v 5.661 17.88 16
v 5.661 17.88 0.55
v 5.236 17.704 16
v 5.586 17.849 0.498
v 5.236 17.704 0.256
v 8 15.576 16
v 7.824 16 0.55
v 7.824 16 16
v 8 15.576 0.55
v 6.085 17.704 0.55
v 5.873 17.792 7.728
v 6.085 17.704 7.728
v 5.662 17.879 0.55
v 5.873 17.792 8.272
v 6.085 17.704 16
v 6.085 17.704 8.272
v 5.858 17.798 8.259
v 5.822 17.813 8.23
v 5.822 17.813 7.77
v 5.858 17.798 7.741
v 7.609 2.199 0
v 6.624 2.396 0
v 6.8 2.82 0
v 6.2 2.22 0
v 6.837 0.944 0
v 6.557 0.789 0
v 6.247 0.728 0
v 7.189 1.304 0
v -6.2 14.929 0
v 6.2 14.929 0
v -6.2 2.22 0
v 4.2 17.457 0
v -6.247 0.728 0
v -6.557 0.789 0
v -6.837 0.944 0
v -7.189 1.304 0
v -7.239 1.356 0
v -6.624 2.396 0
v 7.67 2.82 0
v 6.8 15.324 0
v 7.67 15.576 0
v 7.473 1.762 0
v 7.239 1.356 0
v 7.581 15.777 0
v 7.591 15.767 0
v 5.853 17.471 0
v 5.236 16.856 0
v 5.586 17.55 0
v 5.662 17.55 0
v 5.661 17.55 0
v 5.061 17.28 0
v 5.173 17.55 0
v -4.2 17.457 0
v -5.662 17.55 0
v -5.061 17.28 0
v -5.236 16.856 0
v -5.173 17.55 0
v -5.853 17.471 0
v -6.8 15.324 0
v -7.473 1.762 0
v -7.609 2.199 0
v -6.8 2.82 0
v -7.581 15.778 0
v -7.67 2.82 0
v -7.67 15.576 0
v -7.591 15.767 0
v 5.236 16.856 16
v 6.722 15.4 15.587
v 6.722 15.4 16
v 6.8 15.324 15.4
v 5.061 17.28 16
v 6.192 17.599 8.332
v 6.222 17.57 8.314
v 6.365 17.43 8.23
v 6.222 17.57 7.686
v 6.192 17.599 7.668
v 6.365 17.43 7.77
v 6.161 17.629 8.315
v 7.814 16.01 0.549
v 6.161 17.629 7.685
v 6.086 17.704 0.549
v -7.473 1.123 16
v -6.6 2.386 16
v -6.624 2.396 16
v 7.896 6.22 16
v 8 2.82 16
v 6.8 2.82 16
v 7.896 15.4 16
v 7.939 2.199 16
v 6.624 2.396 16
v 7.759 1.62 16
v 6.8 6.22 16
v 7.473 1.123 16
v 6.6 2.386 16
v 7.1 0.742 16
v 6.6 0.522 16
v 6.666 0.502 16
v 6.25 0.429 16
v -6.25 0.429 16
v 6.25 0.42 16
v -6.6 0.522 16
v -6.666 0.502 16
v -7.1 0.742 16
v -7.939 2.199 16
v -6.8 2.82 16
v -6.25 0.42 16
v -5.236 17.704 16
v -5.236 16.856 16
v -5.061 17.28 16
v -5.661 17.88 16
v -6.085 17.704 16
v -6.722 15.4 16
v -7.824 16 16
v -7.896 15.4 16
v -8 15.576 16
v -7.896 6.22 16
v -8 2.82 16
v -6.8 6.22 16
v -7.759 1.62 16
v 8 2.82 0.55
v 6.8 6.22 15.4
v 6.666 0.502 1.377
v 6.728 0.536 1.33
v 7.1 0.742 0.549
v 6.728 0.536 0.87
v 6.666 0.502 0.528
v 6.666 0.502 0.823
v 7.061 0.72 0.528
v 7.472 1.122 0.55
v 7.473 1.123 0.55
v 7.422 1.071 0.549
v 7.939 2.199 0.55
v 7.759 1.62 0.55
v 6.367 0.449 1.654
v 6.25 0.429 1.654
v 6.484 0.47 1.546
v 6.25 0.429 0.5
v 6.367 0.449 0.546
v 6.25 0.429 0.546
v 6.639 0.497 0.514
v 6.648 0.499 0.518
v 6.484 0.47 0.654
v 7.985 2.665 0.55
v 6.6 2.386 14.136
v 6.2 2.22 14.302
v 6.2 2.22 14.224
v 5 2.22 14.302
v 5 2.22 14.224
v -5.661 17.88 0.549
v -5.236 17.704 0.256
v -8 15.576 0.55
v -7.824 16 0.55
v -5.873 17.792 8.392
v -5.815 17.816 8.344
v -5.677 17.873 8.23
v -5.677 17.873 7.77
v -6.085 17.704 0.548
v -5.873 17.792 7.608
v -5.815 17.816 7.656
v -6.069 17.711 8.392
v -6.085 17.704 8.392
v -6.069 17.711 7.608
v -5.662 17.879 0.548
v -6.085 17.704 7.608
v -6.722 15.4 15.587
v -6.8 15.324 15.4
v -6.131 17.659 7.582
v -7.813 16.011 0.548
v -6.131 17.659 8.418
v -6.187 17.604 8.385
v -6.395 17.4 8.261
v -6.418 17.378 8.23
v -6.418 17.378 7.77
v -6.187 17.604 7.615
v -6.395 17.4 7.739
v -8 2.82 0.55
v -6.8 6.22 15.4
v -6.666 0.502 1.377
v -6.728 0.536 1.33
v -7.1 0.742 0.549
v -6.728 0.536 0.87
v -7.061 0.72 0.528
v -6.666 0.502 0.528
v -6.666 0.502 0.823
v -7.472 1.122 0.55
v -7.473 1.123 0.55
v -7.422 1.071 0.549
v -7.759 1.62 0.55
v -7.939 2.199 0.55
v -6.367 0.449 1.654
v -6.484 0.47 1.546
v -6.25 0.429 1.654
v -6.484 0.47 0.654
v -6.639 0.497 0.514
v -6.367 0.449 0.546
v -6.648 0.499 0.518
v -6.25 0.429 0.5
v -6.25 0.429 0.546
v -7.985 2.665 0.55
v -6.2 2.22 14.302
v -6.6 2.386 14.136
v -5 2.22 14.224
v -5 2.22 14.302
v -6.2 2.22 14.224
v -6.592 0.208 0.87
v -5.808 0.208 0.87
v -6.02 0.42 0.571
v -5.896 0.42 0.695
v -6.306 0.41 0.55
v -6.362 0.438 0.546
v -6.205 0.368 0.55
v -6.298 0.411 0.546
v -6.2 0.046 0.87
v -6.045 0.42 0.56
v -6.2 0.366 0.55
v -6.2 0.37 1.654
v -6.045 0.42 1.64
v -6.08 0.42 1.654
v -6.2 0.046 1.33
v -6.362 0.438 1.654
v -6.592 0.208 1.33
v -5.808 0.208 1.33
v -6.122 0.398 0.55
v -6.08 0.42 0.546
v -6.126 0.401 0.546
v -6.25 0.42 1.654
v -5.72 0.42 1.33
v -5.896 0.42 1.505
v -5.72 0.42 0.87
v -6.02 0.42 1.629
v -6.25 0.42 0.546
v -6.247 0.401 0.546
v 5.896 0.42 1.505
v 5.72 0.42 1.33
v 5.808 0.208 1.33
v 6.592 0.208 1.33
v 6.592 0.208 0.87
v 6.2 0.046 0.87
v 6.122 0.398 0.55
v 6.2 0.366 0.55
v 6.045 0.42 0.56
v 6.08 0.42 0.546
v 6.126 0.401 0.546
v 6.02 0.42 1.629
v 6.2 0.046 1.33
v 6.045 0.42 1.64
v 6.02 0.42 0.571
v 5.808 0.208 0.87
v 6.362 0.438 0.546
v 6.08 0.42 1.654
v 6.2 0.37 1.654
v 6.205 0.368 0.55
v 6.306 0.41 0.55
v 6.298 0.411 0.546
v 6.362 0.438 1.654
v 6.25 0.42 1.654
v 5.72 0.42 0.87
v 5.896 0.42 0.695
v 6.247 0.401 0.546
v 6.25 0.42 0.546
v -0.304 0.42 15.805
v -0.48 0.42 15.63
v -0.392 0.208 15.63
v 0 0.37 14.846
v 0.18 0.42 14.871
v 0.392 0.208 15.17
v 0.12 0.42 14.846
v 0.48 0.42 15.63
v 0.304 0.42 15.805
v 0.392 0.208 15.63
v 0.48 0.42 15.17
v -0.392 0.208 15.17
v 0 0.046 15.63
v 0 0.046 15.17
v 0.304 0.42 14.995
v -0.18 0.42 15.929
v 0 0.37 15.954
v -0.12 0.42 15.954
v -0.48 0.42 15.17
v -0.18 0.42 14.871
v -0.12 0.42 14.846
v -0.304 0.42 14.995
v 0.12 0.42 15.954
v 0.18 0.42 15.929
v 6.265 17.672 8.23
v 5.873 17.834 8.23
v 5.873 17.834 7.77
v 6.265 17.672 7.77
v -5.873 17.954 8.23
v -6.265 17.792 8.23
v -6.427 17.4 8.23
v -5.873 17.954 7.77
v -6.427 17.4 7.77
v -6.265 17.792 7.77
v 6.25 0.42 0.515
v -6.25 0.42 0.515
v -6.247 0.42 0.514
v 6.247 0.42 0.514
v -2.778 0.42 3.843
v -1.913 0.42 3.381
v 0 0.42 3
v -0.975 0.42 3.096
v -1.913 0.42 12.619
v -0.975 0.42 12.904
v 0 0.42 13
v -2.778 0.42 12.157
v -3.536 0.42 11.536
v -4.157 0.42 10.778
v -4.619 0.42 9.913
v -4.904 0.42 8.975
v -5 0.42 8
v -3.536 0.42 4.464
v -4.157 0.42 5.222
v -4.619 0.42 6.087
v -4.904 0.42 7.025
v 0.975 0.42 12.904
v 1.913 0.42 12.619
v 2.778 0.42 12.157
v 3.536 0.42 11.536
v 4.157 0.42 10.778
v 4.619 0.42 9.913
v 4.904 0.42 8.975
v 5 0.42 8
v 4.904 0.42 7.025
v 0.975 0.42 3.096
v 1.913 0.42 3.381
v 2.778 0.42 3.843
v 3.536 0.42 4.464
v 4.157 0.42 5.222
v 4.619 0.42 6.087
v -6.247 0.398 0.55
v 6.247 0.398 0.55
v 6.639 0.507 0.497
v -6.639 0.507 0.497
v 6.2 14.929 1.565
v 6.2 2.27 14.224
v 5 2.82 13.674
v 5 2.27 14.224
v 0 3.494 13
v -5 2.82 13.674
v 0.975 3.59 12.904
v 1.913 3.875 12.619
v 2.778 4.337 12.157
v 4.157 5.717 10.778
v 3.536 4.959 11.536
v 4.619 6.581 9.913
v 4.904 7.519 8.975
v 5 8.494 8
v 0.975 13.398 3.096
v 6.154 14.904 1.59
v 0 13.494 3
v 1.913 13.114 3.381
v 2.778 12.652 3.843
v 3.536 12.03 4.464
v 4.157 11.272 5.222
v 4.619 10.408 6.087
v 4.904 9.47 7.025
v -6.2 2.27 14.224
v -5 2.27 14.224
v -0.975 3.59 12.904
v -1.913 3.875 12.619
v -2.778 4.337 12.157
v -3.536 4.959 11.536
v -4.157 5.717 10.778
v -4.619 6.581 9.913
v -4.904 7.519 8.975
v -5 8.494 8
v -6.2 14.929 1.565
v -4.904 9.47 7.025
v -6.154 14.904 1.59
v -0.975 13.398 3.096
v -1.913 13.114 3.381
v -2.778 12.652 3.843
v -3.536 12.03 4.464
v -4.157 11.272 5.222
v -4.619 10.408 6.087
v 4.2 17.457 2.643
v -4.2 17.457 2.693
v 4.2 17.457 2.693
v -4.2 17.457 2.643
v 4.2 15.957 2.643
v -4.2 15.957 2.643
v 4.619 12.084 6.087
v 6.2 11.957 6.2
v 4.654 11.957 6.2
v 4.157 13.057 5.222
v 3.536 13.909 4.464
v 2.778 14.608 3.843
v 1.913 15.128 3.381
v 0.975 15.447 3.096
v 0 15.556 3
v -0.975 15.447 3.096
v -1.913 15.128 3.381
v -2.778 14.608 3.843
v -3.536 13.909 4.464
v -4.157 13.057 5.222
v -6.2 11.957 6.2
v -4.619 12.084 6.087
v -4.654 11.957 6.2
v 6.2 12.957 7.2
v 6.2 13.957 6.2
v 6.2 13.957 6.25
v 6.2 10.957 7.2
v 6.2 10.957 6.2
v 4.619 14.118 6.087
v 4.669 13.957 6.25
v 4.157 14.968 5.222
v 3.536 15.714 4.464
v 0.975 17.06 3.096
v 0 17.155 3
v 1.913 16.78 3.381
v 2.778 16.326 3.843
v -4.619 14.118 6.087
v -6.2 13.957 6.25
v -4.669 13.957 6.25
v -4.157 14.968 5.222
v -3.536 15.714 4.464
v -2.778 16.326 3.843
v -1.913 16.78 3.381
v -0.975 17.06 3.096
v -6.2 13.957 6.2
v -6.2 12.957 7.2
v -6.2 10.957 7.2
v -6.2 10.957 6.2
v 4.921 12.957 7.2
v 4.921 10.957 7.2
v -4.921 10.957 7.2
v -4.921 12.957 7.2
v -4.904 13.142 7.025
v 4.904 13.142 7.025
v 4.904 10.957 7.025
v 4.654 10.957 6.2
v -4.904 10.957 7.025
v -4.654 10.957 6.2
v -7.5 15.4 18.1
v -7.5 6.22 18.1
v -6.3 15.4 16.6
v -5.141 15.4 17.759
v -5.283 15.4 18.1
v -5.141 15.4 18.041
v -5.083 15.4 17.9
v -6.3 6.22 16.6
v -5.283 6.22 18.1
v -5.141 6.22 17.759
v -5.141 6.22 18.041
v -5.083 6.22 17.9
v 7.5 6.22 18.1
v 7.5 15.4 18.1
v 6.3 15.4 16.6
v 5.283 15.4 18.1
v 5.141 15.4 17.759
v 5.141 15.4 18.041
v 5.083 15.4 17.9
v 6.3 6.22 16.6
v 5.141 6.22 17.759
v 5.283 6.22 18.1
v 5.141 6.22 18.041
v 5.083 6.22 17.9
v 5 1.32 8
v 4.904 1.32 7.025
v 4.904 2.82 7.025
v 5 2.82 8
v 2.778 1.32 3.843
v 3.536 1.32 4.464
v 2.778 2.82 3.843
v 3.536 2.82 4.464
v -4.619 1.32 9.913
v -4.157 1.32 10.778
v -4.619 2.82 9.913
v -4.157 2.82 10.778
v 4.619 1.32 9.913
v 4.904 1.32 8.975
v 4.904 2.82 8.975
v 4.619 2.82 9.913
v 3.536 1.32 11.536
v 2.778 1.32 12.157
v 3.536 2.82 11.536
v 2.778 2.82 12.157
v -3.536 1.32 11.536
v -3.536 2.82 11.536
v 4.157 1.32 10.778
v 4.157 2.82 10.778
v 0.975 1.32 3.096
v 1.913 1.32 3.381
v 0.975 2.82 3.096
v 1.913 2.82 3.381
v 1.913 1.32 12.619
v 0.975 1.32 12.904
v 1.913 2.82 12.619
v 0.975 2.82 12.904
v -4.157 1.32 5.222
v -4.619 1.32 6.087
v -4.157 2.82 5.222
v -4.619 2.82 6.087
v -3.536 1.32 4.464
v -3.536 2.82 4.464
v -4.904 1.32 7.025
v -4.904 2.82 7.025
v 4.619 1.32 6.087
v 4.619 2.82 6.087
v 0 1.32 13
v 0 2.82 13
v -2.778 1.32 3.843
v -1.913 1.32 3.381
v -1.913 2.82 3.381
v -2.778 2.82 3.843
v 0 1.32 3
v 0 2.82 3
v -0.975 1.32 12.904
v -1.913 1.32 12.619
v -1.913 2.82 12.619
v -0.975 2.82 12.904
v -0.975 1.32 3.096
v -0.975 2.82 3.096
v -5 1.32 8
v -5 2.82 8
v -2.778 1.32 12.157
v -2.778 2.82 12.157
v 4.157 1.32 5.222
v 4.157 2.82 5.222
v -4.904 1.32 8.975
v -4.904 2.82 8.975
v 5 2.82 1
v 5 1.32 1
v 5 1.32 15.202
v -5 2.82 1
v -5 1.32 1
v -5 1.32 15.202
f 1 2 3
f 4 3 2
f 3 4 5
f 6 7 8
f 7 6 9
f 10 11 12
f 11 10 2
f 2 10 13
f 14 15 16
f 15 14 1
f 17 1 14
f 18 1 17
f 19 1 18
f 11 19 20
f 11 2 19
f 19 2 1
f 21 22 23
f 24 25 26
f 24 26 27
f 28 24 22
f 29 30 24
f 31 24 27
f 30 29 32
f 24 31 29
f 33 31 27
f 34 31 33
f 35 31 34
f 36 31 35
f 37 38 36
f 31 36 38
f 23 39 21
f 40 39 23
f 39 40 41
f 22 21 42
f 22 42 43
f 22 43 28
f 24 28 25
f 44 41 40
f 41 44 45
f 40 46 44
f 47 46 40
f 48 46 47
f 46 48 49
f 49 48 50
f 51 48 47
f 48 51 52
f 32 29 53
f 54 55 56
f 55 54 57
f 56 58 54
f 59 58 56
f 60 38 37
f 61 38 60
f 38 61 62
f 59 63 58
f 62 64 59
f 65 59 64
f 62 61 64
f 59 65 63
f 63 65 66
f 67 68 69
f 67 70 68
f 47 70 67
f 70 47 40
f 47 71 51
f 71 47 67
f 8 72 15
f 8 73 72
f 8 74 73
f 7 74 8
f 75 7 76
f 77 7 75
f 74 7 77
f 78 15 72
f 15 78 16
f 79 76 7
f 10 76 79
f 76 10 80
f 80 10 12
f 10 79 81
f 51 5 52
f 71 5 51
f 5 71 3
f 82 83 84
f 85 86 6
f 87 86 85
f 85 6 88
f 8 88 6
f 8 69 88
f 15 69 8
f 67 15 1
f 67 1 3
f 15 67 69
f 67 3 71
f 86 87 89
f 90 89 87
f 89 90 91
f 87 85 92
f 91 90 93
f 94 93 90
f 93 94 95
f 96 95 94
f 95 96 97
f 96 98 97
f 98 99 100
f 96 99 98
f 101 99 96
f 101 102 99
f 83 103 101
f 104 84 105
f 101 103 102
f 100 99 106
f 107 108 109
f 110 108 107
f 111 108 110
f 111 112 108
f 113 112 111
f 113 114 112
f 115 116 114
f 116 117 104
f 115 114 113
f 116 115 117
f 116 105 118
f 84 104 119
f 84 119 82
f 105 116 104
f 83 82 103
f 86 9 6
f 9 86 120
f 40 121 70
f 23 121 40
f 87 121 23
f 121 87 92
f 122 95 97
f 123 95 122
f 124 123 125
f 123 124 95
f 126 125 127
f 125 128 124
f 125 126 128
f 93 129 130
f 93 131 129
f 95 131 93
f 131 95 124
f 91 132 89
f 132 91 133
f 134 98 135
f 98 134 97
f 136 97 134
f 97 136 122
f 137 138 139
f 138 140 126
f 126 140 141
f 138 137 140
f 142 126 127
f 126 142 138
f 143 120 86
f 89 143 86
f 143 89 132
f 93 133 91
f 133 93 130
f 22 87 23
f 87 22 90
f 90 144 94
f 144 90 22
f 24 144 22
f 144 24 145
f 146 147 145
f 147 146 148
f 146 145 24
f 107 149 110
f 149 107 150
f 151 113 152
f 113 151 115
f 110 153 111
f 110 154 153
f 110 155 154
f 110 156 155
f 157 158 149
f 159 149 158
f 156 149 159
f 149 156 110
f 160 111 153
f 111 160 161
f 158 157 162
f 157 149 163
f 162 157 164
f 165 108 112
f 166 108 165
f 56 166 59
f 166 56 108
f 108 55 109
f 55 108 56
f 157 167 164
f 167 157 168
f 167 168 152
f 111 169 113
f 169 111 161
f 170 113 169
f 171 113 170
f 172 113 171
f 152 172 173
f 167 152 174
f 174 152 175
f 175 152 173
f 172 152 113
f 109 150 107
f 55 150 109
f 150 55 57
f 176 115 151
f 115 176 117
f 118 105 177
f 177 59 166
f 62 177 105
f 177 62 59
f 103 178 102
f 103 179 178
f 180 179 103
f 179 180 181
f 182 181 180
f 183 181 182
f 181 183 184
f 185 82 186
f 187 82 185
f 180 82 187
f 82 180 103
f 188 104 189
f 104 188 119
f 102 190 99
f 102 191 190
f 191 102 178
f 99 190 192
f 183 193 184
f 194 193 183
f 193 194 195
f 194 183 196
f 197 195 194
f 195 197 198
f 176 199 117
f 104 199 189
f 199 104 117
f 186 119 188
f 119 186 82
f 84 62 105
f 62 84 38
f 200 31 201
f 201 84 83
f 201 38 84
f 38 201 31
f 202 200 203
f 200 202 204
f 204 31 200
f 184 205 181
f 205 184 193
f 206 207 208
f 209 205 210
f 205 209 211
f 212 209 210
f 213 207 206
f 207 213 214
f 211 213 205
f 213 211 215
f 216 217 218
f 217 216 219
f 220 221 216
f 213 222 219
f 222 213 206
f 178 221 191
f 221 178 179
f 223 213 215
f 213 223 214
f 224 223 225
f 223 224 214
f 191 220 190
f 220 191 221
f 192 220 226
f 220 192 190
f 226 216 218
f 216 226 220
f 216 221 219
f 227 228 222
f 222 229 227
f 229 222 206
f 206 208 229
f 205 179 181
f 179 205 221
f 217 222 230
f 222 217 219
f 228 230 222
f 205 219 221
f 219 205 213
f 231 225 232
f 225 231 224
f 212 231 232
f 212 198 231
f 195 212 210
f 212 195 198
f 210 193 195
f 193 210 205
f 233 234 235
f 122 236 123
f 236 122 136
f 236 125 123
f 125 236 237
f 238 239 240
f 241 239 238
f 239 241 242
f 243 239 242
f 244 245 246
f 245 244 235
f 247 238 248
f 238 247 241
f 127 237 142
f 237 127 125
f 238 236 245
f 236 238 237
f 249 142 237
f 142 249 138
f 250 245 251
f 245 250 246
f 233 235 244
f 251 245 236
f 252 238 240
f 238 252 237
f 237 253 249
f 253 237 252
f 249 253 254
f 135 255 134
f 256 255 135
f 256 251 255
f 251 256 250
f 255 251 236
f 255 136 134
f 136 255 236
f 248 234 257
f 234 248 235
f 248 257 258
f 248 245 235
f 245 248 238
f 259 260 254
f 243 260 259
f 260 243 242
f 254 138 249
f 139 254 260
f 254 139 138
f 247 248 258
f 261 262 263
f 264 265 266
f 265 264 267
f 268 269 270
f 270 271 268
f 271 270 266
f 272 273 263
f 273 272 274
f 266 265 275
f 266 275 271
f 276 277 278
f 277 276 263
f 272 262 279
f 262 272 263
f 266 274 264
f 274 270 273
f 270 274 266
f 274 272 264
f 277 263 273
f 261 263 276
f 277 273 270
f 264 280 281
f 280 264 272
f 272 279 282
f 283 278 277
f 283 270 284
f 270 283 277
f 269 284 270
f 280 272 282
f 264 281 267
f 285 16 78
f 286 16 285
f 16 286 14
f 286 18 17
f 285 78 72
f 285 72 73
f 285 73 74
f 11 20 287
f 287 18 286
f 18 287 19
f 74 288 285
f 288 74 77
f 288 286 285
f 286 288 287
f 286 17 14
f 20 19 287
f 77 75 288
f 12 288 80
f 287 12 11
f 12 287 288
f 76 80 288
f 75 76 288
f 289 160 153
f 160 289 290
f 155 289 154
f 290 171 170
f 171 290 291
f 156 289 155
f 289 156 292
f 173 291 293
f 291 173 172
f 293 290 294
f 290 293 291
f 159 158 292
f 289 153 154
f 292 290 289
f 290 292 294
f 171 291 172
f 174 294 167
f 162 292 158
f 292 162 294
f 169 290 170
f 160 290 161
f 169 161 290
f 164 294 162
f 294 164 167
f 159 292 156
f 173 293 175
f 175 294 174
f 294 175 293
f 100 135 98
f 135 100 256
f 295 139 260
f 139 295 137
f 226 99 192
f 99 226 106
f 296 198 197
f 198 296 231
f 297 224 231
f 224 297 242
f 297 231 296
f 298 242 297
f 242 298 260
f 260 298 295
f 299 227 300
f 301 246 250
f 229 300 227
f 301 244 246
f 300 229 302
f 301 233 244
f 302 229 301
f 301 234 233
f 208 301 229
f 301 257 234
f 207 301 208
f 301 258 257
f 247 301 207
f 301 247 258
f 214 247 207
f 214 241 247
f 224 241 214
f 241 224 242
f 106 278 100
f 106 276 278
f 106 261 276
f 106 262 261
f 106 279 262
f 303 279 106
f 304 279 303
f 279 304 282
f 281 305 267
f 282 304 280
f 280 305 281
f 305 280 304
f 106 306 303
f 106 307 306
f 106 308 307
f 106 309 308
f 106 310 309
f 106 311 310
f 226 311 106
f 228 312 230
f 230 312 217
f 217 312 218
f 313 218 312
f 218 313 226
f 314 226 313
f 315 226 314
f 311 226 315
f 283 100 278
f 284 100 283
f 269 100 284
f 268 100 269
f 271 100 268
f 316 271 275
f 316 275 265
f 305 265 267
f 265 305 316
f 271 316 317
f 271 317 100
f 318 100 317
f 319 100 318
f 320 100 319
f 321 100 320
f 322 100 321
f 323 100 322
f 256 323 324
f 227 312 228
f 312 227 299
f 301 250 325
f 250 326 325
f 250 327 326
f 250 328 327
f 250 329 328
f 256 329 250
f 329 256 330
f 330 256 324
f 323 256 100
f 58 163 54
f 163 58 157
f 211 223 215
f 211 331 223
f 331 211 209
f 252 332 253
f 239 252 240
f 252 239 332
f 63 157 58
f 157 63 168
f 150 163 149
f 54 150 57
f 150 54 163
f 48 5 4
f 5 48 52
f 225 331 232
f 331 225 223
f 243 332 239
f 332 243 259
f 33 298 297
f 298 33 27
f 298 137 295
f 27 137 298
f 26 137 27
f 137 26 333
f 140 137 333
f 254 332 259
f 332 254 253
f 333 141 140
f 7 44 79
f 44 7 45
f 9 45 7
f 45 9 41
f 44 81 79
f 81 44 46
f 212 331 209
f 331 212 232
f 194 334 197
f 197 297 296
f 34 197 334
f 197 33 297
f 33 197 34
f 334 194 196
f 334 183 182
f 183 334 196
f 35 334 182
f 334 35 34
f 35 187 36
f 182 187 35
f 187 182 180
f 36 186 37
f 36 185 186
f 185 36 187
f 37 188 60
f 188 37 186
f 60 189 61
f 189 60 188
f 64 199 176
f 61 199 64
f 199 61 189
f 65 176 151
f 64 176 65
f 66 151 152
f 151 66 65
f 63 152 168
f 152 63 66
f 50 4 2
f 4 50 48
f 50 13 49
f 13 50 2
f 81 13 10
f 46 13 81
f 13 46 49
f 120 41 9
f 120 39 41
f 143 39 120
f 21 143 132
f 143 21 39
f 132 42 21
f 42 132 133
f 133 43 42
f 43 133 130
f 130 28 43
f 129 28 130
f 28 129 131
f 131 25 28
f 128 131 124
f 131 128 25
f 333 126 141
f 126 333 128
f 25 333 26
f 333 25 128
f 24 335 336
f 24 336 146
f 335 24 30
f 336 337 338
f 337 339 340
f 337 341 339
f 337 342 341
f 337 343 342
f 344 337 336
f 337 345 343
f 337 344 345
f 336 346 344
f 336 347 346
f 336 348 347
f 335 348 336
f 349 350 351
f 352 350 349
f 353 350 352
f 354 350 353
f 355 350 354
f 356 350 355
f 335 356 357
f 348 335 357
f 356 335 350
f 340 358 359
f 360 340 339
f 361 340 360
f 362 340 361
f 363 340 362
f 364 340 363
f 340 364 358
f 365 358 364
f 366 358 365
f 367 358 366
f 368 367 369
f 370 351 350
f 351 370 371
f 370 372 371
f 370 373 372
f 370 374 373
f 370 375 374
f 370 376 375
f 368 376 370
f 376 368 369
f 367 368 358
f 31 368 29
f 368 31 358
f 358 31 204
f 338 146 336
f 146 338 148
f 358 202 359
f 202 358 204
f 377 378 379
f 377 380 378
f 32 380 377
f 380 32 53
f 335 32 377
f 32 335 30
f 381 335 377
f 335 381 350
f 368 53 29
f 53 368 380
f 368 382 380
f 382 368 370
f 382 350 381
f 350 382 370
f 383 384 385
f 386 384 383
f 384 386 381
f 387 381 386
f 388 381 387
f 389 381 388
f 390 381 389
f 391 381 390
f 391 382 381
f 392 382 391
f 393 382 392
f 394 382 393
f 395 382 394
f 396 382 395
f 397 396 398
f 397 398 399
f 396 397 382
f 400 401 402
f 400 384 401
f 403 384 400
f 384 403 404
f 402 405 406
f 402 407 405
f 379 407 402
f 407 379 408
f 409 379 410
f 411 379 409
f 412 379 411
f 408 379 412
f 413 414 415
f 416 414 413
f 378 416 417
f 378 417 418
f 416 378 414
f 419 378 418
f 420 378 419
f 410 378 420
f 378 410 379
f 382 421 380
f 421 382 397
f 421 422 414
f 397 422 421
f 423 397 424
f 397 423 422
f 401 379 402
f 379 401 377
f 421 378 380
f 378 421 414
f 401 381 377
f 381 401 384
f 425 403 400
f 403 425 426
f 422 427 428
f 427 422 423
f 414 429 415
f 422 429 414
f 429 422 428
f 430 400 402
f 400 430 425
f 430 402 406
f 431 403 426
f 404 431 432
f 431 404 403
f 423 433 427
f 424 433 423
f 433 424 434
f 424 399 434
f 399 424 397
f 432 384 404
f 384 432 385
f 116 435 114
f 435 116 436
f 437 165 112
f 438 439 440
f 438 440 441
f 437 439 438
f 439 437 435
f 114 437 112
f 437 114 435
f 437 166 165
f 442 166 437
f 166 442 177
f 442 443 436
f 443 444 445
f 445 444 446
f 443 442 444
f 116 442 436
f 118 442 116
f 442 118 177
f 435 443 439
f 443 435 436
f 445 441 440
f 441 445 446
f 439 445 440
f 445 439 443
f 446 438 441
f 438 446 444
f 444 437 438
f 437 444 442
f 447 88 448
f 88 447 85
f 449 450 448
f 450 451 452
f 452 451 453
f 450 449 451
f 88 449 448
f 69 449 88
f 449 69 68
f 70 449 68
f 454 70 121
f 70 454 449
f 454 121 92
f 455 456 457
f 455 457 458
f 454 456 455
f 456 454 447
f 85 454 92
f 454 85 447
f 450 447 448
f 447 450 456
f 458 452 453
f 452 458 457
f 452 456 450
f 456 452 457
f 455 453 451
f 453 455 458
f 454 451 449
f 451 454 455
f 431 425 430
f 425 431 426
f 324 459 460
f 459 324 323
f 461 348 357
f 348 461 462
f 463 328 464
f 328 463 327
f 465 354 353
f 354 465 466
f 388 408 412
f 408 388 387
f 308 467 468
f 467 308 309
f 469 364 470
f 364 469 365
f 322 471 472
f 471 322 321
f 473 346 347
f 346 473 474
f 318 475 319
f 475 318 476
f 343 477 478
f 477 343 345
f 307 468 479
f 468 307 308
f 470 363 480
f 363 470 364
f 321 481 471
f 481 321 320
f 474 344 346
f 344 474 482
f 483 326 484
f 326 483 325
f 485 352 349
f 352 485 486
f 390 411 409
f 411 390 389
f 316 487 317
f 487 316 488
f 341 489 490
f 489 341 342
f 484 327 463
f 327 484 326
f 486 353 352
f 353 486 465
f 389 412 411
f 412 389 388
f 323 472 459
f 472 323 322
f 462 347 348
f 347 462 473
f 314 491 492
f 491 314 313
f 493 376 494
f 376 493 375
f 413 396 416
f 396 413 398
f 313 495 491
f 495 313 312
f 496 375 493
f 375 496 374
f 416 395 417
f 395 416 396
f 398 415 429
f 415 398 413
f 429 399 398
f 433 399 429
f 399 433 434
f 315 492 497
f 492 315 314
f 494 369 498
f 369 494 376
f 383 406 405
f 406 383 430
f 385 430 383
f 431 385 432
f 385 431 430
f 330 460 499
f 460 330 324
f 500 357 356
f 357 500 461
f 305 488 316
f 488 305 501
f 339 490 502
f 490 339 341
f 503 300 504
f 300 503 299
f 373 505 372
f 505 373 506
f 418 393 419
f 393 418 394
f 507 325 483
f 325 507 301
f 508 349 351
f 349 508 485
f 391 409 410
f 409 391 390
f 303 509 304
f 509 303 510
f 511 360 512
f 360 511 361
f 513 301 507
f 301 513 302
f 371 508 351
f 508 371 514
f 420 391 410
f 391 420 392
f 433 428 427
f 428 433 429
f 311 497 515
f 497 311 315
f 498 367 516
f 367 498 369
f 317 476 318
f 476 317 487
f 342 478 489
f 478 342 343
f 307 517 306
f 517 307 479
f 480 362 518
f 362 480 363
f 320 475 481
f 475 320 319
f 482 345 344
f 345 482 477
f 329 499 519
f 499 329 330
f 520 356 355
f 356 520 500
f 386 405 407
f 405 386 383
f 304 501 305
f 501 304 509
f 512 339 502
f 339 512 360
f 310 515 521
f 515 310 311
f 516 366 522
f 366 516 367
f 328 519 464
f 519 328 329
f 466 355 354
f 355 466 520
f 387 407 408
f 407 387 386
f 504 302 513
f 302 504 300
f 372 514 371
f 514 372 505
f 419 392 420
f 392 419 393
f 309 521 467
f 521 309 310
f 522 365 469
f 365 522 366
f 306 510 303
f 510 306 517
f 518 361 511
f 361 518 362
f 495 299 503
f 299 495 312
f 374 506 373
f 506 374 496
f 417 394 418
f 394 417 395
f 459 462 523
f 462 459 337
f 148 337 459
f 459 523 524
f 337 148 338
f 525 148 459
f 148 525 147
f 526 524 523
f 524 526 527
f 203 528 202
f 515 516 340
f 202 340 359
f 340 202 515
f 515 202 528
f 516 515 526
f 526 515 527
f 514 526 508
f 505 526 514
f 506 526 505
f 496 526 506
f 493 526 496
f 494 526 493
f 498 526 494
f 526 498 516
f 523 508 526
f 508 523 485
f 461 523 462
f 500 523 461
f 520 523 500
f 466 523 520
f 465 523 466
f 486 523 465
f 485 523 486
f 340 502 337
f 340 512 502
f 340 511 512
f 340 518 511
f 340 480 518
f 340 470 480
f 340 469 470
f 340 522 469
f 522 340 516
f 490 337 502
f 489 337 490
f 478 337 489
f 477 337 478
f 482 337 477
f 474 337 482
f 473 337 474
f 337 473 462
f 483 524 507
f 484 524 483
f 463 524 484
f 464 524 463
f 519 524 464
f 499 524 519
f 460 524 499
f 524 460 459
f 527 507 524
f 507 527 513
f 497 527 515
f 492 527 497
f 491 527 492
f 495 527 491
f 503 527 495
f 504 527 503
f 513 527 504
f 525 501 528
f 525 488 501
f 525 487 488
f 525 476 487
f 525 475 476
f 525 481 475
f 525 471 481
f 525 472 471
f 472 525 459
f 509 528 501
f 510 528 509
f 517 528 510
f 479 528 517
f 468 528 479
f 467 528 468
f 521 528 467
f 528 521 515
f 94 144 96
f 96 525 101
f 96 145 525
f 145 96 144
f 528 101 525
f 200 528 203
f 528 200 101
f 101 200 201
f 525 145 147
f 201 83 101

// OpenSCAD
// file: libs/libdict.scad
// This library add dictionary like features to openscad
// the dictionary is a list of pairs as we cannot define new types.
// Unlike a python dictionary we cannot do a proper hash table for speed
// so everything is build around the OpenSCAD search function
// There are a lot of assert statements to ensure data in the "dictionary"
// is in the format of
// * A list of lists
// * Each internal list has a length of two
// * First element of each internal list is a string (the key)
// * All keys are unique.


// Private function:
// This function returns true if the value is in the list
// value must be a string.
// No error checking, for use by is_in only!
function _is_in_str(value, list) = 
    search([value], list) != [[]];

// Private function:
// This function returns true if the value is in the list
// value must be a number.
// No error checking, for use by is_in only!
function _is_in_num(value, list) = 
    search(value, list) != [];


// This function returns true if the value is in the list
// value must be a string or a number.
function is_in(value, list) = 
    assert(is_num(value) || is_string(value) , "is_in: value must be a number or string")
    assert(is_list(list), "is_in: list must be a list")
    is_num(value) ? _is_in_num(value, list) : _is_in_str(value, list);

// An errant match is when a non-list matches with the first element in a list
// a list match a non list though. Cannot know which element is the non-list
// but we do know that it is errant if exactly one of them is not a list
function _check_errant_match(list, match) = let(
    non_list = [for (m = match) is_list(list[m])? 0 : 1],
    // note when recording count_nl (counting non lists) it is first recorded before anything is iterated.
    // the second recording happens after i is iterated to 0, then count_nl counts whether non_list[0] is 1
    count = [for (i=-1, count_nl=0; i<len(match);i=i+1,count_nl=count_nl+non_list[i]) count_nl]
    // the last element (count[len(match)] is equal to 1 on an errant match)
) count[len(match)] == 1 ? 0 : 1;

// Returns true if all emements in list are unique.
function is_unique(list) = 
    assert(is_list(list), "is_unique: list must be a list")
    let(
        matches = search(list, list, 0),
        // Assign 1 or 0 depending on is the match length for each element
        // return wether any matches are greater than one (mathcing more than
        // itself)
        // note cannot search for true or false so using 1 and zero
        bool_list = [for (match = matches) if (len(match)==1) 0 
            // should put a 1 here to show they matched but in the case of
            // [1, [1]] it will match both, so need to check if they are
            // both lists or both not list
            else _check_errant_match(list, match)]
    ) !is_in(1, bool_list);

// Private function:
// Checks that the input is a list and that every element is a list
// of length 2.
// No error checking, for use by valid_dict only!
function _is_pairs(list) =
    !is_list(list) ? false :
        len(list)==0 ? false :
            !is_in(0, [for (pair = list) is_list(pair) && len(pair)==2 ? 1: 0]);

// Private function:
// Checks all elements in the list are strings
// No error checking, for use by valid_dict only!
// Strings can't be empty
function _is_list_of_strings(list) =
    !is_in(0, [for (item = list) is_string(item) && len(item)>0 ? 1: 0]);

// Private function:
// Returns the keus in a dictionary
// No error checking, for use by valid_dict only!
function _keylist(dict)  = [for (pair=dict) pair[0]];
 
function valid_dict(dict) =
    //if the input are not pairs return instantly
    !_is_pairs(dict) ? false : let (
        //if they are pairs get all keys
        keys = _keylist(dict),
        all_strings =  _is_list_of_strings(keys),
        unique = is_unique(keys)
    ) (all_strings && unique) ? true : false;

// Key lookup for key value pair "dictionary".
// Unlike the built in lookup this works with strings.
function key_lookup(key, dict) = 
    assert(is_string(key), "`key` must be a string")
    assert(valid_dict(dict), "`dict` must be a valid 'dictionary'")
    let(
        // key is in [] because otherwise openscad will search for each letter rather than the string.
        index = search([key], dict, 1, 0)[0]
    )  assert (index!=[], "Key lookup failed, key not found!") dict[index][1];

// Creates a new dictionary with a key value pair replaced. Pair must already
// be in dictionary.
function replace_value(key, value, dict) = 
    assert(is_string(key), "`key` must be a string")
    assert(valid_dict(dict), "`dict` must be a valid 'dictionary'")
    assert(is_in(key, _keylist(dict)), "`key` not found in dictionary!")
    [for (kv_pair = dict) key!=kv_pair[0] ? kv_pair : [key, value]];


// Creates a new dictionary with a a set of key value pair replaced
// both inputs must be a dictionary. All keys in input must already be
// in dictionary
function replace_multiple_values(rep_dict, dict) =
    assert(valid_dict(rep_dict), "`rep dict` must be a valid 'dictionary'")
    assert(valid_dict(dict), "`dict` must be a valid 'dictionary'")
    let(
        // loop over all keys in replacement dict checking they are in the original
        rep_keys = [for (key = _keylist(rep_dict))
            assert(is_in(key, _keylist(dict)), "`key` not found in dictionary!")
            key
        ]
    ) //Finally return the updated dictionary using this long list comprehension.
    [
        for (kv_pair = dict) let(
            key = kv_pair[0],
            // check if this key is in the replacement dictionary and if so return index
            // key is in [] because otherwise openscad will search for each letter rather
            // than the string.
            index = search([key], rep_dict, 1, 0)[0]
            // if index is empty return original key value pair, else return the key with
            // the replaced value
        ) index == [] ? kv_pair : [key, rep_dict[index][1]]
    ];
// file: microscope_parameters.scad
/******************************************************************
*                                                                 *
* OpenFlexure Microscope: Microscope Parameters                   *
*                                                                 *
* This is the top-level configuration file for the OpenFlexure    *
* microscope, an open microscope and 3-axis translation stage.    *
* It gets really good precision over a ~10mm range, by using      *
* plastic flexure mechanisms.                                     *
*                                                                 *
* Generally I've tried to put parts (or collections of closely    *
* related parts) in their own files.  However, all the parts      *
* depend on the geometry of the microscope - so these parameters  *
* are gathered together here.  In general, the ones you might     *
* to change are towards the top!  Lower-down ones are defined in  *
* terms of higher-up ones - confusion might arise if you redefine *
* these later...                                                  *
*                                                                 *
* (c) Richard Bowman, January 2016                                *
* Released under the CERN Open Hardware License                   *
*                                                                 *
* http://www.github.com/rwb27/openflexure_microscope              *
* http://www.docubricks.com/projects/openflexure-microscope       *
* http://www.waterscope.org                                       *
*                                                                 *
******************************************************************/

use <libs/libdict.scad>

$fn=32;

// These are the most useful parameters to change!
motor_lugs = true;
version_numstring = "6.1.3";
camera = "picamera_2"; //see cameras/camera.scad for valid values
optics = "rms_f50d13"; //see optics.scad for valid values
led_r = 4.5/2; //size of the LED used for illumination
endstops = false; //whether to build mounts for optical endstops inside the microscope.
feet_endstops = false; //whether to include cut-outs for endstop switches in the feet.
beamsplitter = true; //enables a cut-out in some optics modules for a beamsplitter

enable_smart_brim = true;
tall_bucket_base = false; //If true creates a taller bucket base for the infinity corrected optics.

// This sets the basic geometry of the default microscope
// Stages can be built with modified parameters but with **no guarantee** that any other
// set of parameters will work.
// These parameters define the default size for the structural elements of the micoroscope, optics parameters are set seperately.
function default_params() = [["leg_r", 30],     // radius on which the innermost part of legs sit. (This sets the stage size)
                             ["sample_z", 75 ], // z position of sample
                             ["stage_t", 15],   //thickness of the XY stage (at thickest point, most is 1mm less)
                             ["leg_block_t", 5], // Thickness of the block at the top and bottom of the leg
                             ["stage_hole_r", 20], // size of hole in the stage
                             ["xy_lever_ratio", 4.0/7.0], // mechanical advantage of actuator over xy-stage - can be used to trade speed and precision
                             ["z_lever_ratio", 1.0], //  mechanical advantage of actuator over objective mount (must be >1)
                             ["condenser_angle", 15], //angle of the top of the condenser relative to the xy plane
                             ["print_ties", true], //sets whether the ties that support printing are on. It is usefull to be able to turn these off for rendering
                             ["smart_brim_r", 5] // The radius of the smart brim on the main body
                            ]; 


// height of the top of the leg. Shorter than sample x so that you can get nuts in, and so the slide doesn't crash.
function leg_height(params) = let(
    sample_z = key_lookup("sample_z", params),
    stage_t = key_lookup("stage_t", params),
    leg_block_t = key_lookup("leg_block_t", params)
) sample_z - stage_t + leg_block_t;



// The variables below affect the position of the objective mount
z_strut_l = 18; //length of struts supporting Z carriage
objective_mount_y = 18; // y position of clip for optics
objective_mount_nose_w = 6; // width of the pointy end of the mount
condenser_clip_w = 14; // width of the dovetail clip for the condenser
foot_height=15;

// This variables set the dimensions of flexures.
// It is well tested with PLA.
function flex_dims() = let
(
    flex_w = 4, // width  of flexures
    flex_l = 1.5,    // length of flexures
    flex_t = 0.75// thickness  of flexures
)  [flex_w, flex_l, flex_t];

// This returns the sine of the angle through which flexures can be bent
// Note: sin(8.62 deg) = 0.15
function flex_a() = 0.15;


// TODO: Work out what to do with this. This used to be called every time the params file was included
//       but as we move away from includes it is less useful, and sample_z is no longer global.
// Compile a sensible version string
//version_string = str("v",version_numstring, sample_z, motor_lugs?"-M":"");
//echo(str("Compiling OpenFlexure Microscope ",version_string));


stage_hole_inset = flex_dims().y+4; // how far the holes on the XY stage are inset from leg_r
flex_z1 = 0;      // z position of lower flexures for XY axis
function flex_z2(params) = leg_height(params) - key_lookup("leg_block_t", params); //height of upper XY flexures
z_strut_t = 6;  // (z) thickness of struts for Z axis
function leg_dims(params) = [4,flex_dims().x,flex_z2(params)+flex_dims().z]; // size of vertical legs
leg_middle_w = 12; // width of the middle part of each leg
actuator_h = 25; //height of the actuator columns
dz = 0.5; //small increment in Z (~ 2 layers)

function leg_outer_w(params) = leg_middle_w + 2*flex_dims().y + 2*leg_dims(params).x; // overall width of parallelogram legs that support the stage

//TODO understand and check this. Where are those numbers from?
// dimensions of the core part of the actuating levers for X and Y -
// NB should match the column_base_r in compact_nut_seat.scad
function actuator_dims(params) = let(
    width = 3*1.2+2*2
 ) [width, actuating_nut_r(params), 6];

// TODO: Work out why this has this name and change it
// distance from leg_r to the actuating nut/screw for the XY axes
// Length of actuator is the diference in sistance between flexures
// at top and bottom of leg, multiplied by the lever ratio
function actuating_nut_r(params) = let(
    xy_lever_ratio = key_lookup("xy_lever_ratio", params)
) (flex_z2(params) - flex_z1) * xy_lever_ratio;

function xy_actuator_travel(params) = actuating_nut_r(params)*0.15; // distance moved by XY axis actuators

// Z axis
z_flexures_z1 = 8; // height of the lower flexure on z actuator
function z_flexures_z2(params) = min(leg_height(params) - 12, 35); // height of the upper flexure on z actuator
objective_mount_back_y = objective_mount_y + 2; //back of objective mount
z_anchor_y = objective_mount_back_y + z_strut_l + 2*flex_dims().y; // fixed end of the flexure-hinged lever that actuates the Z axis
z_anchor_w = 20; //width of the Z anchor

//required actuator lever length
function z_lever_length(params) = let(
    z_lever_ratio = key_lookup("z_lever_ratio", params)
) (z_strut_l + flex_dims().y)*z_lever_ratio;


function z_nut_y(params) = let(
    // Note that the lever is tilted so we need to find the y projection
    // from the z lever length and the z position of the bottom z flexure
    lev_len_sq = pow(z_lever_length(params), 2),
    bot_z_flex_z_sq = pow(z_flexures_z1, 2),
    z_lever_y_proj = sqrt(lev_len_sq - bot_z_flex_z_sq)
    ) z_anchor_y - flex_dims().y/2 + z_lever_y_proj;


function z_actuator_travel(params) = z_lever_length(params)*0.15; // distance moved by the Z actuator
function z_actuator_tilt(params) = -asin(z_flexures_z1/z_lever_length(params)); //angle of the Z actuator

//TODO understand and rename this
// x position of the outside of the Z-axis static anchors (either side of the XY stage, on the X axis) 
// (no longer used by Z axis but still in use elsewhere.)
function z_flexure_x(params) = let(
    leg_r = key_lookup("leg_r", params),
    tenth_of_height = max(5,leg_dims(params).z*0.1)
) (leg_r-flex_dims().y-tenth_of_height)*sqrt(2);

leg_link_spacing = 10;
base_t=1; // thickness of the flat base of the structure
wall_h=15; // height of the stiffening vertical(ish) walls
wall_t=2; //thickness of the stiffening walls
function inner_wall_h(params) = z_flexures_z2(params) - 10; //height of walls inside xy_stage

// base_mounting_holes returns a list of the holes for mounting the microscope
// to the base. By default it returns all four holes.
// To get only the lugs run `base_mounting_holes("lugs")`
// To get only the front holes run `base_mounting_holes("front")`
function base_mounting_holes(params, type="all") = let
(
    lug_pos = [[z_flexure_x(params)+4,-8,0],
               [-z_flexure_x(params)-4,-8,0]],
    front_pos =[[-20,z_nut_y(params)-4,0],
                [20,z_nut_y(params)-4,0]],
    lugs = (type == "lugs") || (type == "all"),
    front = (type == "front") || (type == "all"),
    //Set which holse to output
    holes = [lugs?lug_pos:[], front?front_pos:[]]
    //Final list comprehension make a single list of holes
) [for (h = holes) each h];

endstop_extra_ringheight=feet_endstops?1:0;

fl_cube_w = 16; //width of the fluorescence filter cube
// main file
/******************************************************************
*                                                                 *
* OpenFlexure Microscope: Optics unit                             *
*                                                                 *
* This is part of the OpenFlexure microscope, an open-source      *
* microscope and 3-axis translation stage.  It gets really good   *
* precision over a ~10mm range, by using plastic flexure          *
* mechanisms.                                                     *
*                                                                 *
* The optics module holds the camera and whatever lens you are    *
* using as an objective - current options are either the lens     *
* from the Raspberry Pi camera module, or an RMS objective lens   *
* and a second "tube length conversion" lens (usually 40mm).      *
*                                                                 *
* See the section at the bottom of the file for different         *
* versions, to suit different combinations of optics/cameras.     *
* NB you set the camera in the variable at the top of the file.   *
*                                                                 *
* (c) Richard Bowman, January 2016                                *
* Released under the CERN Open Hardware License                   *
*                                                                 *
******************************************************************/

use <./libs/utilities.scad>
include <microscope_parameters.scad> // NB this defines "camera" and "optics"


module chamfer_bottom_edge(chamfer=0.3, h=0.5){
    difference(){
        children();

        minkowski(){
            cylinder(r1=2*chamfer, r2=0, h=2*h, center=true);
            linear_extrude(tiny()) difference(){
                square(999, center=true);
                projection(cut=true) translate([0,0,-tiny()]) hull() children();
            }
        }
    }
}

module fl_cube_outer(){
    // The outer body for fl_cube()
    roc = 0.6;
    w = fl_cube_w;
    foot = roc*0.7;
    bottom_t = roc*3;
    $fn=8;
    chamfer_bottom_edge() union(){
        reflect([1,0,0]){
            // outer "arms" that are responsible for the tight fit
            sequential_hull(){
                translate([w/2-2-roc*0.8/sqrt(2), w+2-roc*1.2, 0]) cylinder(r=roc, h=w);
                translate([w/2-roc, w-roc/sqrt(2), 0]) cylinder(r=roc, h=w);
                translate([w/2-roc, foot+bottom_t+roc, 0]) cylinder(r=roc, h=w);
            }
            translate([w/2-3*roc, foot+bottom_t+roc, 0]) difference(){
                // the curved bits at the bottom
                resize([0,(bottom_t+roc)*2,0]) cylinder(r=3*roc, h=w, $fn=24);
                // cut out the inner radius
                cylinder(r=roc, h=999, center=true);
                // restrict it to a quarter-turn
                mirror([1,0,0]) translate([-roc,0,-99]) cube(999);
                mirror([1,0,0]) translate([0,-roc,-99]) cube(999);
            }
        }
        // join the two arms together at the bottom
        translate([0,foot+bottom_t/2, w/2]) cube([w - roc*3*2 + 2*tiny(), bottom_t, w], center=true);

        // feet at the bottom (and also in the middle of the top part)
        for(p = [[-w/2+roc*3, roc, roc+0.5],
                 [w/2-roc*3, roc, roc+0.5],
                 [0, roc, w-roc],
                 [w/2-2-roc*0.3/sqrt(2), w+2-roc*1.2, w/2],
                 [-(w/2-2-roc*0.3/sqrt(2)), w+2-roc*1.0, w/2]
                ]){
            translate(p) sphere(r=roc,$fn=8);
        }
    }
}

module fl_cube(){
    // Filter cube that slots into a suitably-modified optics module
    // This prints with the Y axis vertical - to save rotating all the
    // cylinders, it's written here as printed.
    roc = 0.6;
    w = fl_cube_w;
    foot = roc*0.7;
    bottom_t = roc*3;
    dichroic = [12,16,1.1];
    dichroic_t = dichroic.z;
    emission_filter = [10,14,1.5];
    beamsplit = [0, w/2+2, w/2];
    inner_w = w - 6*roc;
    bottom = bottom_t + foot;
    $fn=8;
    difference(){
        union(){
            fl_cube_outer();

            // mount for 45 degree dichroic, with bottom retaining clip
            by = beamsplit.y + dichroic.y/2/sqrt(2) + 0.3; //coated tip of dichroic + wiggle room
            bz = beamsplit.z - dichroic.y/2/sqrt(2) + 0.3; //coated tip of dichroic + wiggle room
            bby = beamsplit.y + dichroic.y/2/sqrt(2) - dichroic.z/sqrt(2); //back tip of dichroic
            bbz = beamsplit.z - dichroic.y/2/sqrt(2) - dichroic.z/sqrt(2); //back tip of dichroic
            sequential_hull(){
                translate([-inner_w/2, bottom, 0]) cube([inner_w, tiny(), beamsplit.z + beamsplit.y - bottom - dichroic_t*sqrt(2)]); // tall back of triangle
                translate([-inner_w/2, bby, 0]) cube([inner_w, tiny(), bbz]); //pointy end of triangle
                translate([-inner_w/2+2, by, 0]) cube([inner_w-4, 1.5, bz]); //far end
                translate([-inner_w/2+2, by, bz]) cube([inner_w-4, 1.5, tiny()]); //start of retaining clip
                translate([-inner_w/2, by - 4, 4 + 2*dichroic_t]) cube([inner_w, 2, tiny()]); //end of retaining clip
                translate([-inner_w/2, by - 5, 4 + 2*dichroic_t]) cube([inner_w, 2, 1]); //overhanging bit
            }

            // attachment for the excitation filter and LED
            reflect([1,0,0]) translate([-w/2, bottom + 4, w]) sequential_hull(){
                depth = w-bottom-4-roc;
                translate([0,0,-roc]) cube([2*roc, depth, tiny()]);
                translate([0.5,0,roc]) cube([2*roc, depth, 1.5]);
                translate([0.5+2*roc + 1.5 - 0.2*(1+sqrt(2)),0,roc+1.5-0.2]) rotate([-90,0,0]) cylinder(r=0.2, h=depth);//cube([2*roc + 1.5, depth, d]);
            }
        }
        // hole for the beam
        translate(beamsplit) rotate([90,0,0]) cylinder(r=5,h=999, center=true, $fn=32);
        // hole for the emission filter
        translate([-emission_filter.x/2, bottom - roc*1.5, beamsplit.z-emission_filter.y/2]) cube([emission_filter.x, emission_filter.z, 999]);
        // access hole for the dichroic
        translate(beamsplit) rotate([-45,0,0]) translate([0,-dichroic.y/2,0]) scale([1.1,1,1.9]) cube(dichroic, center=true);
    }
}

fl_cube();
